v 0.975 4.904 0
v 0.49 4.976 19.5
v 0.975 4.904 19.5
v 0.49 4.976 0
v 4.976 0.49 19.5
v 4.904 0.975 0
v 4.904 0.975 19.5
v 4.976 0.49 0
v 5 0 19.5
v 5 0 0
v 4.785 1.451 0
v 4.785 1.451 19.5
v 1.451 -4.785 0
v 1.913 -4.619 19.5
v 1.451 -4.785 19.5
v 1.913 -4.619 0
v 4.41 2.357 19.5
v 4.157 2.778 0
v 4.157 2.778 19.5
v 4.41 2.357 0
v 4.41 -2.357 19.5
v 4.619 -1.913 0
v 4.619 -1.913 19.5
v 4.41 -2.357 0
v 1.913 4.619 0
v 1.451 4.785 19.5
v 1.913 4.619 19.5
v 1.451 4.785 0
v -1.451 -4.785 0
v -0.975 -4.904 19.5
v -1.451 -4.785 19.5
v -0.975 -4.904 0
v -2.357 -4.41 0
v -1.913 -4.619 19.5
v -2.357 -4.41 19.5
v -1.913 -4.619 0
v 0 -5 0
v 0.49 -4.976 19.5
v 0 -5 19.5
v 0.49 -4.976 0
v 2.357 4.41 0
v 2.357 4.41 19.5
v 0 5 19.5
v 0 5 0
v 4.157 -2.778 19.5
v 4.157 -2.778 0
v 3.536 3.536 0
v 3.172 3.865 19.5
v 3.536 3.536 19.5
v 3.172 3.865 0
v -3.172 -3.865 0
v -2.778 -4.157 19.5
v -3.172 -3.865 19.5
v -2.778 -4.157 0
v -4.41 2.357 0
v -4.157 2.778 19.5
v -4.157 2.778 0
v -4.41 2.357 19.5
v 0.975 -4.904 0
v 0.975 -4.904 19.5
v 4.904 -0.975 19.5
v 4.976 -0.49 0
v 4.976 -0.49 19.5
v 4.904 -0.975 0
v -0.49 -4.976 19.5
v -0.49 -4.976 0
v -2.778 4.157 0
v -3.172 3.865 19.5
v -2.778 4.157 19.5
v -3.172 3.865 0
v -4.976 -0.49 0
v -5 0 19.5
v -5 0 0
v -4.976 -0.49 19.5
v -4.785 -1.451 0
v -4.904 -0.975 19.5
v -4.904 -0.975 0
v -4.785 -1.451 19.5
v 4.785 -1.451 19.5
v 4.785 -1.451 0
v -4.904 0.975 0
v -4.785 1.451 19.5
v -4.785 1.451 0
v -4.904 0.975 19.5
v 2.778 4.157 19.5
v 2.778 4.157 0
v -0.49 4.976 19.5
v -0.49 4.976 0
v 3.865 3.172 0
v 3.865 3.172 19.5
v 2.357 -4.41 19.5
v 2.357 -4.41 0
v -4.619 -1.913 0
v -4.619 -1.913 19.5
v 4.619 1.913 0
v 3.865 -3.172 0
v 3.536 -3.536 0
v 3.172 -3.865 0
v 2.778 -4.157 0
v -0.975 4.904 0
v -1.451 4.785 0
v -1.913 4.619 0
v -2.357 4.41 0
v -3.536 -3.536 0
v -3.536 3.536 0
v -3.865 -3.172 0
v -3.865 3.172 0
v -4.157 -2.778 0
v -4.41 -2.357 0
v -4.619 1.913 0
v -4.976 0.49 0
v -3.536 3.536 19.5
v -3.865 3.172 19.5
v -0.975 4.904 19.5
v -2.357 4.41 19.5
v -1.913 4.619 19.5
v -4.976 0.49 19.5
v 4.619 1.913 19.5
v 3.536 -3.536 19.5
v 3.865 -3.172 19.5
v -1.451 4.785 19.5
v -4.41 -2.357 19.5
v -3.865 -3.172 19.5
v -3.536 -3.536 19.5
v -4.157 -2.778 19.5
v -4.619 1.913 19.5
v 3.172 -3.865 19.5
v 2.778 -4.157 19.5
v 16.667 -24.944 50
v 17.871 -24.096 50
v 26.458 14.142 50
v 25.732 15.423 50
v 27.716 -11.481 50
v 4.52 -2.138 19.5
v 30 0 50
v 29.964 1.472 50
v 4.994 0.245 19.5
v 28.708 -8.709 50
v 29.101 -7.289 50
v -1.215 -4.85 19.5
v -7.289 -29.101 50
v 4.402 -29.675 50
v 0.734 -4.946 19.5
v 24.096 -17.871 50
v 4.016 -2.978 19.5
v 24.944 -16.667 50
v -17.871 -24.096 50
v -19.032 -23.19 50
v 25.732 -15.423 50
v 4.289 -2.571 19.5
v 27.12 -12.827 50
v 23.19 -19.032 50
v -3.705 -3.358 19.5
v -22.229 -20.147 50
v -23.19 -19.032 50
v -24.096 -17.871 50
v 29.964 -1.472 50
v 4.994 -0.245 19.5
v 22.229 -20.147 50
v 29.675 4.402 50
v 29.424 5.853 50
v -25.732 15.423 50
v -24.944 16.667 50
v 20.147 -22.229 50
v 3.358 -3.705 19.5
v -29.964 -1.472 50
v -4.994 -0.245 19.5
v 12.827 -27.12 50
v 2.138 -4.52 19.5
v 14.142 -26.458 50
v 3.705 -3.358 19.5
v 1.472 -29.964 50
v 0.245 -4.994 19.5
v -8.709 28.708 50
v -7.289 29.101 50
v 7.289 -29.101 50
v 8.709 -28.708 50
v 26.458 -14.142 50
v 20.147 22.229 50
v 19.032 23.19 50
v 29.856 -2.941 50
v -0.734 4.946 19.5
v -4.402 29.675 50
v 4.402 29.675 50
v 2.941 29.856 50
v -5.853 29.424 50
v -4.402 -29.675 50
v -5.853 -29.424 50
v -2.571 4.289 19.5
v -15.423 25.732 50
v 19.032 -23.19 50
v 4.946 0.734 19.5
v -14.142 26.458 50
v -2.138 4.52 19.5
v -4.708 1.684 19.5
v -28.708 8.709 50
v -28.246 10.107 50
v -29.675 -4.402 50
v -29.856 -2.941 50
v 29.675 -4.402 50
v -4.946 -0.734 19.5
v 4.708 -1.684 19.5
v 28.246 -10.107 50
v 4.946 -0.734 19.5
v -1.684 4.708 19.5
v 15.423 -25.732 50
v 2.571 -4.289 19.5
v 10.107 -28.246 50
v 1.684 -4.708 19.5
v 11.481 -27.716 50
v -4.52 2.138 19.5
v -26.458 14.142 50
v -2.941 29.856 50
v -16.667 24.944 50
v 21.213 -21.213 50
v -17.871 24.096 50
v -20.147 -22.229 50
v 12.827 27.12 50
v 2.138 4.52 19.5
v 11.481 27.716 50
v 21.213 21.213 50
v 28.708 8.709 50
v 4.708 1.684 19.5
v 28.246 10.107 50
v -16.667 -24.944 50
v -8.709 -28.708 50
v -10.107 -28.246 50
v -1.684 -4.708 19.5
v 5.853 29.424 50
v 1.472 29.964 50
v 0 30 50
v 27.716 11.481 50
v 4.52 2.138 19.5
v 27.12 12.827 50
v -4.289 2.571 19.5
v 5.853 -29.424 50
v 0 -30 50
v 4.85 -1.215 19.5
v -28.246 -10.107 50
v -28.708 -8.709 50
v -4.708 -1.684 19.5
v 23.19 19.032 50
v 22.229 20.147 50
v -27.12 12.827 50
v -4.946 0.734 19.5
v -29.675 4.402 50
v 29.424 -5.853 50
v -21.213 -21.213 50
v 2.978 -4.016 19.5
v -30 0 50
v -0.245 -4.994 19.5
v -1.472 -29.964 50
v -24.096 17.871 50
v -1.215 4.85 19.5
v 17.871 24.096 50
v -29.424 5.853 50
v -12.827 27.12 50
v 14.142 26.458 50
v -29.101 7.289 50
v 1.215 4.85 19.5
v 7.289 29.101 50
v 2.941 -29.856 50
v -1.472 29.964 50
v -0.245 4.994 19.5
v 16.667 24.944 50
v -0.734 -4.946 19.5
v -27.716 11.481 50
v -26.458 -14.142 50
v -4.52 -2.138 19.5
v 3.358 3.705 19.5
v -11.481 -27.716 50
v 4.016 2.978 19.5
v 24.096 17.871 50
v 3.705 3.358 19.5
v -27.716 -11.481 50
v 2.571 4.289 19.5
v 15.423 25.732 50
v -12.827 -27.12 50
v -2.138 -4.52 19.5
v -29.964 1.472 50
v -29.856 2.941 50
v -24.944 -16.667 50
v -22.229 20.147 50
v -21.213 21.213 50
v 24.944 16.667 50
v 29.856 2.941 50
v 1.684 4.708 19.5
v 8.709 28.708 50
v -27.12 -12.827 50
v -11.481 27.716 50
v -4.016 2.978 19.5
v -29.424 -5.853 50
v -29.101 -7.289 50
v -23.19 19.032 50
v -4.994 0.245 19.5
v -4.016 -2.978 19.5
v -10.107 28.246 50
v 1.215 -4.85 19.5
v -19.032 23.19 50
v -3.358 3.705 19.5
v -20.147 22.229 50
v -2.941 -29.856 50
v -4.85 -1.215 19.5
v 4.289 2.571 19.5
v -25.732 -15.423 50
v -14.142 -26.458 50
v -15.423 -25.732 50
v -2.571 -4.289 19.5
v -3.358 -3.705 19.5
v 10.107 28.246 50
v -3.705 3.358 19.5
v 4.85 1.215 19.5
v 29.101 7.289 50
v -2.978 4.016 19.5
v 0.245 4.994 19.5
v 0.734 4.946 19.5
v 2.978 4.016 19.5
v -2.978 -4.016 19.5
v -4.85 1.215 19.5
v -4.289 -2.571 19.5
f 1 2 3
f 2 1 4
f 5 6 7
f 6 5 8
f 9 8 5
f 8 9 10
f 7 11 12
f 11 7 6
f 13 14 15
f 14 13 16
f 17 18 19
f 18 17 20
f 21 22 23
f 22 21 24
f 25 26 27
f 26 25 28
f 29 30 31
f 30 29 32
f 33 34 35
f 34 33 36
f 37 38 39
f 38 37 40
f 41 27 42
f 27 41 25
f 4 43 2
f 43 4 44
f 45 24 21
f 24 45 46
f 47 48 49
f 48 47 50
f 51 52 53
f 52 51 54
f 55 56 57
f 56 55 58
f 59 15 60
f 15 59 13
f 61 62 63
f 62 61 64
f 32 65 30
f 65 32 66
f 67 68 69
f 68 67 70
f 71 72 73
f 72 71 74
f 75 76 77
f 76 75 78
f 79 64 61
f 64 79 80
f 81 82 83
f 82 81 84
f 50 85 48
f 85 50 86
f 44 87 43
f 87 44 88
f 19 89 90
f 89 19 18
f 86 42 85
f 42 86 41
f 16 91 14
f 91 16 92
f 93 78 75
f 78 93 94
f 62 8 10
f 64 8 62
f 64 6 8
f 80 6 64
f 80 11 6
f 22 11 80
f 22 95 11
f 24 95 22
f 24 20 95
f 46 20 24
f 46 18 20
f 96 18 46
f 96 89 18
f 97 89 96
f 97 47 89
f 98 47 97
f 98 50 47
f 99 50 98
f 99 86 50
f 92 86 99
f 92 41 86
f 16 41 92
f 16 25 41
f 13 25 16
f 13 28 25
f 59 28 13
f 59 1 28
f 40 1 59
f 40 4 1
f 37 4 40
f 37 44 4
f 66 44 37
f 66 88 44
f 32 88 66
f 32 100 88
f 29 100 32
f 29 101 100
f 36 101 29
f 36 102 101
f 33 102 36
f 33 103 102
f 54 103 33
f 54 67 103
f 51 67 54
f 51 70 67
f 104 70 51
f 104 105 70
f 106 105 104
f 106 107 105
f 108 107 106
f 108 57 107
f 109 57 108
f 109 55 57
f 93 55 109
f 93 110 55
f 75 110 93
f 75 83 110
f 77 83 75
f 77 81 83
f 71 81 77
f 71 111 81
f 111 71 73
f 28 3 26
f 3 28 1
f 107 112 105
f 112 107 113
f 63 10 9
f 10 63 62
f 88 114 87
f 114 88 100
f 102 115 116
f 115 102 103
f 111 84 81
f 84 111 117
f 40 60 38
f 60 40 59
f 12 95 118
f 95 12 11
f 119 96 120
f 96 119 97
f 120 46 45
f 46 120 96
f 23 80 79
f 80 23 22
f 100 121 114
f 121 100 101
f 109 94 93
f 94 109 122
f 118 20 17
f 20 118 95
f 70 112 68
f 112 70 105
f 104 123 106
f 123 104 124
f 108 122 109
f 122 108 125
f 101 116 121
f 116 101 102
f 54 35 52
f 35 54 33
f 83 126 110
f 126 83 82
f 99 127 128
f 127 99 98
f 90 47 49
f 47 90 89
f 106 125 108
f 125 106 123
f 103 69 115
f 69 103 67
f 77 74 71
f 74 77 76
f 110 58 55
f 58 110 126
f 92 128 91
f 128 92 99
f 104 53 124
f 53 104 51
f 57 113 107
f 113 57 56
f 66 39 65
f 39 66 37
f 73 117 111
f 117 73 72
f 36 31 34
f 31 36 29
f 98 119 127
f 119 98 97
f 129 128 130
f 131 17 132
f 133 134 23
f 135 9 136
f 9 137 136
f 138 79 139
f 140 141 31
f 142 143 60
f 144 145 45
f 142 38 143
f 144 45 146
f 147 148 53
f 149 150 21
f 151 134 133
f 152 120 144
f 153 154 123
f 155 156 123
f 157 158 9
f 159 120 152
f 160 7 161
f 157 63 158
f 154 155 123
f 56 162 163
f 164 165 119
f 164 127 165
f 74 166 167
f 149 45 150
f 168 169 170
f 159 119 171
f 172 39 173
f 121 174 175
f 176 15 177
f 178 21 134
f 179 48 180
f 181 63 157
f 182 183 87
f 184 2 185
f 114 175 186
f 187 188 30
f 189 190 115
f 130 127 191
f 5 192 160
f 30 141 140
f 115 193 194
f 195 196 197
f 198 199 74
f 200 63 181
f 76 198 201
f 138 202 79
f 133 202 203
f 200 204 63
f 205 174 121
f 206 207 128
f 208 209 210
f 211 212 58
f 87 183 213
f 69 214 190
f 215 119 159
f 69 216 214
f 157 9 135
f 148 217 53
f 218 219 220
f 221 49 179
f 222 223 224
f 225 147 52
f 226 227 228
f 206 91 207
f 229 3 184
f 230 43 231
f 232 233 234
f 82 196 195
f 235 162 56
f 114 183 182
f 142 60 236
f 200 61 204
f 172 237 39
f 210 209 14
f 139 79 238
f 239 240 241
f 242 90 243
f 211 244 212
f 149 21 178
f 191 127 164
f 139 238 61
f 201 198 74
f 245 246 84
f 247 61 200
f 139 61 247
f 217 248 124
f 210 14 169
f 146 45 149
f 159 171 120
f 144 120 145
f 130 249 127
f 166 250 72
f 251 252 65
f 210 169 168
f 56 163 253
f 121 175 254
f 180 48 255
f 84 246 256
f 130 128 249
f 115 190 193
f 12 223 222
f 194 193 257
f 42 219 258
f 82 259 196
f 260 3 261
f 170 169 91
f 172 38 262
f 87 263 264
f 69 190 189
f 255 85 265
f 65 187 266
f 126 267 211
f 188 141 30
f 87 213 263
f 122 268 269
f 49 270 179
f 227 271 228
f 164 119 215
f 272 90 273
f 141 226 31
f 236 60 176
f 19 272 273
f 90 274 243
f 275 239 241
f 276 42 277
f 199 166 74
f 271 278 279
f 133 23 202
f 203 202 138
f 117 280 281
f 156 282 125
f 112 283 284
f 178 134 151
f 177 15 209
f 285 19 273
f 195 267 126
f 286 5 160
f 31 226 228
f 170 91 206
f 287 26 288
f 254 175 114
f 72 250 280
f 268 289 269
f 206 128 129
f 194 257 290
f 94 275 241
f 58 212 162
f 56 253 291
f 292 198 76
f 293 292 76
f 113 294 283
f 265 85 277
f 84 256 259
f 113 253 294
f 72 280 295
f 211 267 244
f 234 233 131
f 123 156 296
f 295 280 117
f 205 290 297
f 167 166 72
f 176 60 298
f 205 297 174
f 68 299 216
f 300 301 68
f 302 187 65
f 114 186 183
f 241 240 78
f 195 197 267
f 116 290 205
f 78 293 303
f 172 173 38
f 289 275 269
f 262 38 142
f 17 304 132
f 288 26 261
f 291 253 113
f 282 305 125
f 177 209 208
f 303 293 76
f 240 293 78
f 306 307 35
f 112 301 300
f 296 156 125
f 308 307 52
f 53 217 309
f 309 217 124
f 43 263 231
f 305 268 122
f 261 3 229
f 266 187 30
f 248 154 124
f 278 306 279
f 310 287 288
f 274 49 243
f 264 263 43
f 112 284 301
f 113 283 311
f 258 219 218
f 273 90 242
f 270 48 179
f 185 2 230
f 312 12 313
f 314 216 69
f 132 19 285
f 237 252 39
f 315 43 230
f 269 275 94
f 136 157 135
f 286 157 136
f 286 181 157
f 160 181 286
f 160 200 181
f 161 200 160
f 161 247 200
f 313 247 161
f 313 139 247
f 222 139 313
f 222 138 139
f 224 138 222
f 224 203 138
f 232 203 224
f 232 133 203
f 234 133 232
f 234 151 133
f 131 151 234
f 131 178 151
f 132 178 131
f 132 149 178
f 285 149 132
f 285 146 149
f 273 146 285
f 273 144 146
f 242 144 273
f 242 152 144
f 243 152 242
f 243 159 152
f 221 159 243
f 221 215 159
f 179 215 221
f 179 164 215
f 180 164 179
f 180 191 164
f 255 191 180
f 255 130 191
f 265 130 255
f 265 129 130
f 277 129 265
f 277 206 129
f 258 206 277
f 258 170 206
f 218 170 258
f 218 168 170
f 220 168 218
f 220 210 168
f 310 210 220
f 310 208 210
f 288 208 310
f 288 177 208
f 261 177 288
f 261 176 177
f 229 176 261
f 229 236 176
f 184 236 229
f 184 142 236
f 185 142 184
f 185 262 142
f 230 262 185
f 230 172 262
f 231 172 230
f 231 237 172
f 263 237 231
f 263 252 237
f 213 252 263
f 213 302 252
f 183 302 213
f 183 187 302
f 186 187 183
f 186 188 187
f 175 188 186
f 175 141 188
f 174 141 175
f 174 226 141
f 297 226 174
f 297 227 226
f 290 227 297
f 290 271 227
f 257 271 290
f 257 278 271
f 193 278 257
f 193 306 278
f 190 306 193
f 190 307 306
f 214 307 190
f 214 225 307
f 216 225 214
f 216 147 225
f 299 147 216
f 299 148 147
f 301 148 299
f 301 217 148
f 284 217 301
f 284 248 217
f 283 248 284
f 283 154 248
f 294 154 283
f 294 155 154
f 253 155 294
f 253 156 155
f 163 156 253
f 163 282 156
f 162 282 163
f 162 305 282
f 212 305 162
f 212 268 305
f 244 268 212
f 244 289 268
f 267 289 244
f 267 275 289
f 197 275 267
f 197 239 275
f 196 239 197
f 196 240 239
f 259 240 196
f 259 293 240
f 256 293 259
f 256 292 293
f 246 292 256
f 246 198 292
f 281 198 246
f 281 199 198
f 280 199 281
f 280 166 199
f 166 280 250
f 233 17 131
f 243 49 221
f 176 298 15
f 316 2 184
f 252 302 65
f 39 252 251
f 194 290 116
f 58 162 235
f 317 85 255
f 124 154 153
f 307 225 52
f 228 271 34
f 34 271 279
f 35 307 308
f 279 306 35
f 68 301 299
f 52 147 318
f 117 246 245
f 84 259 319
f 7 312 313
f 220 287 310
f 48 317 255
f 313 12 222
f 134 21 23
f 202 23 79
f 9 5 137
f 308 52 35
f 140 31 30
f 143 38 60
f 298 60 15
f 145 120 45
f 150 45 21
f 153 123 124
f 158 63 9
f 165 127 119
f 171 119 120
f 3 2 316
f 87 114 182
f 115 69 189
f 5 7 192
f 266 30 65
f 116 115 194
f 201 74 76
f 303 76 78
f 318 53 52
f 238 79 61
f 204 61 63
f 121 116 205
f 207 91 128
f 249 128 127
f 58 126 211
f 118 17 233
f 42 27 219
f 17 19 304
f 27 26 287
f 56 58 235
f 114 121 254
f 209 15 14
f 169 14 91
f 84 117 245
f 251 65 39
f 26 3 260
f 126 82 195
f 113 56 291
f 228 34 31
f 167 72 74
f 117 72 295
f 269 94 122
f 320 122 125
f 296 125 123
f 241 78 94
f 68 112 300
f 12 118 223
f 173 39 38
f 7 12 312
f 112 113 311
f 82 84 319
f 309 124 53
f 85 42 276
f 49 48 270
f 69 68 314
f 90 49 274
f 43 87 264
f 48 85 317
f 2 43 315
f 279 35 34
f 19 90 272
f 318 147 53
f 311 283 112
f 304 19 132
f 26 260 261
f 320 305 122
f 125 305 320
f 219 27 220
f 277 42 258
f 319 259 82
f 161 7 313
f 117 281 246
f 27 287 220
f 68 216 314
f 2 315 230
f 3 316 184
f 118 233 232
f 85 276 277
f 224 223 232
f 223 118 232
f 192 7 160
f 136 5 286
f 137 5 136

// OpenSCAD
// Small lab funnel, printed upright with the wide opening at the top
// All dimensions in millimetres

$fn = 64;

// ---- Parameters ----
spout_od        = 10;    // outer diameter of the straight spout
spout_h         = 20;    // spout height (z = 0 to z = 20)
spout_wall      = 1.6;   // wall thickness of the spout (bore = 6.8 mm)

cone_bottom_od  = 10;    // cone outer diameter at its base (z = 20)
cone_top_od     = 60;    // cone outer diameter at the rim (z = 50)
cone_rim_h      = 50;    // funnel rim height

overlap         = 0.5;   // overlap of the spout into the cone for a clean union

// ---- Model ----
union() {
    // Straight spout, open at both ends
    translate([0, 0, 0])
        cylinder(h = spout_h + overlap, d = spout_od, $fn = 64);

    // Cone widening from the spout base up to the rim
    translate([0, 0, spout_h - overlap])
        cylinder(h = cone_rim_h - spout_h + overlap,
                 d1 = cone_bottom_od,
                 d2 = cone_top_od,
                 $fn = 128);
}
